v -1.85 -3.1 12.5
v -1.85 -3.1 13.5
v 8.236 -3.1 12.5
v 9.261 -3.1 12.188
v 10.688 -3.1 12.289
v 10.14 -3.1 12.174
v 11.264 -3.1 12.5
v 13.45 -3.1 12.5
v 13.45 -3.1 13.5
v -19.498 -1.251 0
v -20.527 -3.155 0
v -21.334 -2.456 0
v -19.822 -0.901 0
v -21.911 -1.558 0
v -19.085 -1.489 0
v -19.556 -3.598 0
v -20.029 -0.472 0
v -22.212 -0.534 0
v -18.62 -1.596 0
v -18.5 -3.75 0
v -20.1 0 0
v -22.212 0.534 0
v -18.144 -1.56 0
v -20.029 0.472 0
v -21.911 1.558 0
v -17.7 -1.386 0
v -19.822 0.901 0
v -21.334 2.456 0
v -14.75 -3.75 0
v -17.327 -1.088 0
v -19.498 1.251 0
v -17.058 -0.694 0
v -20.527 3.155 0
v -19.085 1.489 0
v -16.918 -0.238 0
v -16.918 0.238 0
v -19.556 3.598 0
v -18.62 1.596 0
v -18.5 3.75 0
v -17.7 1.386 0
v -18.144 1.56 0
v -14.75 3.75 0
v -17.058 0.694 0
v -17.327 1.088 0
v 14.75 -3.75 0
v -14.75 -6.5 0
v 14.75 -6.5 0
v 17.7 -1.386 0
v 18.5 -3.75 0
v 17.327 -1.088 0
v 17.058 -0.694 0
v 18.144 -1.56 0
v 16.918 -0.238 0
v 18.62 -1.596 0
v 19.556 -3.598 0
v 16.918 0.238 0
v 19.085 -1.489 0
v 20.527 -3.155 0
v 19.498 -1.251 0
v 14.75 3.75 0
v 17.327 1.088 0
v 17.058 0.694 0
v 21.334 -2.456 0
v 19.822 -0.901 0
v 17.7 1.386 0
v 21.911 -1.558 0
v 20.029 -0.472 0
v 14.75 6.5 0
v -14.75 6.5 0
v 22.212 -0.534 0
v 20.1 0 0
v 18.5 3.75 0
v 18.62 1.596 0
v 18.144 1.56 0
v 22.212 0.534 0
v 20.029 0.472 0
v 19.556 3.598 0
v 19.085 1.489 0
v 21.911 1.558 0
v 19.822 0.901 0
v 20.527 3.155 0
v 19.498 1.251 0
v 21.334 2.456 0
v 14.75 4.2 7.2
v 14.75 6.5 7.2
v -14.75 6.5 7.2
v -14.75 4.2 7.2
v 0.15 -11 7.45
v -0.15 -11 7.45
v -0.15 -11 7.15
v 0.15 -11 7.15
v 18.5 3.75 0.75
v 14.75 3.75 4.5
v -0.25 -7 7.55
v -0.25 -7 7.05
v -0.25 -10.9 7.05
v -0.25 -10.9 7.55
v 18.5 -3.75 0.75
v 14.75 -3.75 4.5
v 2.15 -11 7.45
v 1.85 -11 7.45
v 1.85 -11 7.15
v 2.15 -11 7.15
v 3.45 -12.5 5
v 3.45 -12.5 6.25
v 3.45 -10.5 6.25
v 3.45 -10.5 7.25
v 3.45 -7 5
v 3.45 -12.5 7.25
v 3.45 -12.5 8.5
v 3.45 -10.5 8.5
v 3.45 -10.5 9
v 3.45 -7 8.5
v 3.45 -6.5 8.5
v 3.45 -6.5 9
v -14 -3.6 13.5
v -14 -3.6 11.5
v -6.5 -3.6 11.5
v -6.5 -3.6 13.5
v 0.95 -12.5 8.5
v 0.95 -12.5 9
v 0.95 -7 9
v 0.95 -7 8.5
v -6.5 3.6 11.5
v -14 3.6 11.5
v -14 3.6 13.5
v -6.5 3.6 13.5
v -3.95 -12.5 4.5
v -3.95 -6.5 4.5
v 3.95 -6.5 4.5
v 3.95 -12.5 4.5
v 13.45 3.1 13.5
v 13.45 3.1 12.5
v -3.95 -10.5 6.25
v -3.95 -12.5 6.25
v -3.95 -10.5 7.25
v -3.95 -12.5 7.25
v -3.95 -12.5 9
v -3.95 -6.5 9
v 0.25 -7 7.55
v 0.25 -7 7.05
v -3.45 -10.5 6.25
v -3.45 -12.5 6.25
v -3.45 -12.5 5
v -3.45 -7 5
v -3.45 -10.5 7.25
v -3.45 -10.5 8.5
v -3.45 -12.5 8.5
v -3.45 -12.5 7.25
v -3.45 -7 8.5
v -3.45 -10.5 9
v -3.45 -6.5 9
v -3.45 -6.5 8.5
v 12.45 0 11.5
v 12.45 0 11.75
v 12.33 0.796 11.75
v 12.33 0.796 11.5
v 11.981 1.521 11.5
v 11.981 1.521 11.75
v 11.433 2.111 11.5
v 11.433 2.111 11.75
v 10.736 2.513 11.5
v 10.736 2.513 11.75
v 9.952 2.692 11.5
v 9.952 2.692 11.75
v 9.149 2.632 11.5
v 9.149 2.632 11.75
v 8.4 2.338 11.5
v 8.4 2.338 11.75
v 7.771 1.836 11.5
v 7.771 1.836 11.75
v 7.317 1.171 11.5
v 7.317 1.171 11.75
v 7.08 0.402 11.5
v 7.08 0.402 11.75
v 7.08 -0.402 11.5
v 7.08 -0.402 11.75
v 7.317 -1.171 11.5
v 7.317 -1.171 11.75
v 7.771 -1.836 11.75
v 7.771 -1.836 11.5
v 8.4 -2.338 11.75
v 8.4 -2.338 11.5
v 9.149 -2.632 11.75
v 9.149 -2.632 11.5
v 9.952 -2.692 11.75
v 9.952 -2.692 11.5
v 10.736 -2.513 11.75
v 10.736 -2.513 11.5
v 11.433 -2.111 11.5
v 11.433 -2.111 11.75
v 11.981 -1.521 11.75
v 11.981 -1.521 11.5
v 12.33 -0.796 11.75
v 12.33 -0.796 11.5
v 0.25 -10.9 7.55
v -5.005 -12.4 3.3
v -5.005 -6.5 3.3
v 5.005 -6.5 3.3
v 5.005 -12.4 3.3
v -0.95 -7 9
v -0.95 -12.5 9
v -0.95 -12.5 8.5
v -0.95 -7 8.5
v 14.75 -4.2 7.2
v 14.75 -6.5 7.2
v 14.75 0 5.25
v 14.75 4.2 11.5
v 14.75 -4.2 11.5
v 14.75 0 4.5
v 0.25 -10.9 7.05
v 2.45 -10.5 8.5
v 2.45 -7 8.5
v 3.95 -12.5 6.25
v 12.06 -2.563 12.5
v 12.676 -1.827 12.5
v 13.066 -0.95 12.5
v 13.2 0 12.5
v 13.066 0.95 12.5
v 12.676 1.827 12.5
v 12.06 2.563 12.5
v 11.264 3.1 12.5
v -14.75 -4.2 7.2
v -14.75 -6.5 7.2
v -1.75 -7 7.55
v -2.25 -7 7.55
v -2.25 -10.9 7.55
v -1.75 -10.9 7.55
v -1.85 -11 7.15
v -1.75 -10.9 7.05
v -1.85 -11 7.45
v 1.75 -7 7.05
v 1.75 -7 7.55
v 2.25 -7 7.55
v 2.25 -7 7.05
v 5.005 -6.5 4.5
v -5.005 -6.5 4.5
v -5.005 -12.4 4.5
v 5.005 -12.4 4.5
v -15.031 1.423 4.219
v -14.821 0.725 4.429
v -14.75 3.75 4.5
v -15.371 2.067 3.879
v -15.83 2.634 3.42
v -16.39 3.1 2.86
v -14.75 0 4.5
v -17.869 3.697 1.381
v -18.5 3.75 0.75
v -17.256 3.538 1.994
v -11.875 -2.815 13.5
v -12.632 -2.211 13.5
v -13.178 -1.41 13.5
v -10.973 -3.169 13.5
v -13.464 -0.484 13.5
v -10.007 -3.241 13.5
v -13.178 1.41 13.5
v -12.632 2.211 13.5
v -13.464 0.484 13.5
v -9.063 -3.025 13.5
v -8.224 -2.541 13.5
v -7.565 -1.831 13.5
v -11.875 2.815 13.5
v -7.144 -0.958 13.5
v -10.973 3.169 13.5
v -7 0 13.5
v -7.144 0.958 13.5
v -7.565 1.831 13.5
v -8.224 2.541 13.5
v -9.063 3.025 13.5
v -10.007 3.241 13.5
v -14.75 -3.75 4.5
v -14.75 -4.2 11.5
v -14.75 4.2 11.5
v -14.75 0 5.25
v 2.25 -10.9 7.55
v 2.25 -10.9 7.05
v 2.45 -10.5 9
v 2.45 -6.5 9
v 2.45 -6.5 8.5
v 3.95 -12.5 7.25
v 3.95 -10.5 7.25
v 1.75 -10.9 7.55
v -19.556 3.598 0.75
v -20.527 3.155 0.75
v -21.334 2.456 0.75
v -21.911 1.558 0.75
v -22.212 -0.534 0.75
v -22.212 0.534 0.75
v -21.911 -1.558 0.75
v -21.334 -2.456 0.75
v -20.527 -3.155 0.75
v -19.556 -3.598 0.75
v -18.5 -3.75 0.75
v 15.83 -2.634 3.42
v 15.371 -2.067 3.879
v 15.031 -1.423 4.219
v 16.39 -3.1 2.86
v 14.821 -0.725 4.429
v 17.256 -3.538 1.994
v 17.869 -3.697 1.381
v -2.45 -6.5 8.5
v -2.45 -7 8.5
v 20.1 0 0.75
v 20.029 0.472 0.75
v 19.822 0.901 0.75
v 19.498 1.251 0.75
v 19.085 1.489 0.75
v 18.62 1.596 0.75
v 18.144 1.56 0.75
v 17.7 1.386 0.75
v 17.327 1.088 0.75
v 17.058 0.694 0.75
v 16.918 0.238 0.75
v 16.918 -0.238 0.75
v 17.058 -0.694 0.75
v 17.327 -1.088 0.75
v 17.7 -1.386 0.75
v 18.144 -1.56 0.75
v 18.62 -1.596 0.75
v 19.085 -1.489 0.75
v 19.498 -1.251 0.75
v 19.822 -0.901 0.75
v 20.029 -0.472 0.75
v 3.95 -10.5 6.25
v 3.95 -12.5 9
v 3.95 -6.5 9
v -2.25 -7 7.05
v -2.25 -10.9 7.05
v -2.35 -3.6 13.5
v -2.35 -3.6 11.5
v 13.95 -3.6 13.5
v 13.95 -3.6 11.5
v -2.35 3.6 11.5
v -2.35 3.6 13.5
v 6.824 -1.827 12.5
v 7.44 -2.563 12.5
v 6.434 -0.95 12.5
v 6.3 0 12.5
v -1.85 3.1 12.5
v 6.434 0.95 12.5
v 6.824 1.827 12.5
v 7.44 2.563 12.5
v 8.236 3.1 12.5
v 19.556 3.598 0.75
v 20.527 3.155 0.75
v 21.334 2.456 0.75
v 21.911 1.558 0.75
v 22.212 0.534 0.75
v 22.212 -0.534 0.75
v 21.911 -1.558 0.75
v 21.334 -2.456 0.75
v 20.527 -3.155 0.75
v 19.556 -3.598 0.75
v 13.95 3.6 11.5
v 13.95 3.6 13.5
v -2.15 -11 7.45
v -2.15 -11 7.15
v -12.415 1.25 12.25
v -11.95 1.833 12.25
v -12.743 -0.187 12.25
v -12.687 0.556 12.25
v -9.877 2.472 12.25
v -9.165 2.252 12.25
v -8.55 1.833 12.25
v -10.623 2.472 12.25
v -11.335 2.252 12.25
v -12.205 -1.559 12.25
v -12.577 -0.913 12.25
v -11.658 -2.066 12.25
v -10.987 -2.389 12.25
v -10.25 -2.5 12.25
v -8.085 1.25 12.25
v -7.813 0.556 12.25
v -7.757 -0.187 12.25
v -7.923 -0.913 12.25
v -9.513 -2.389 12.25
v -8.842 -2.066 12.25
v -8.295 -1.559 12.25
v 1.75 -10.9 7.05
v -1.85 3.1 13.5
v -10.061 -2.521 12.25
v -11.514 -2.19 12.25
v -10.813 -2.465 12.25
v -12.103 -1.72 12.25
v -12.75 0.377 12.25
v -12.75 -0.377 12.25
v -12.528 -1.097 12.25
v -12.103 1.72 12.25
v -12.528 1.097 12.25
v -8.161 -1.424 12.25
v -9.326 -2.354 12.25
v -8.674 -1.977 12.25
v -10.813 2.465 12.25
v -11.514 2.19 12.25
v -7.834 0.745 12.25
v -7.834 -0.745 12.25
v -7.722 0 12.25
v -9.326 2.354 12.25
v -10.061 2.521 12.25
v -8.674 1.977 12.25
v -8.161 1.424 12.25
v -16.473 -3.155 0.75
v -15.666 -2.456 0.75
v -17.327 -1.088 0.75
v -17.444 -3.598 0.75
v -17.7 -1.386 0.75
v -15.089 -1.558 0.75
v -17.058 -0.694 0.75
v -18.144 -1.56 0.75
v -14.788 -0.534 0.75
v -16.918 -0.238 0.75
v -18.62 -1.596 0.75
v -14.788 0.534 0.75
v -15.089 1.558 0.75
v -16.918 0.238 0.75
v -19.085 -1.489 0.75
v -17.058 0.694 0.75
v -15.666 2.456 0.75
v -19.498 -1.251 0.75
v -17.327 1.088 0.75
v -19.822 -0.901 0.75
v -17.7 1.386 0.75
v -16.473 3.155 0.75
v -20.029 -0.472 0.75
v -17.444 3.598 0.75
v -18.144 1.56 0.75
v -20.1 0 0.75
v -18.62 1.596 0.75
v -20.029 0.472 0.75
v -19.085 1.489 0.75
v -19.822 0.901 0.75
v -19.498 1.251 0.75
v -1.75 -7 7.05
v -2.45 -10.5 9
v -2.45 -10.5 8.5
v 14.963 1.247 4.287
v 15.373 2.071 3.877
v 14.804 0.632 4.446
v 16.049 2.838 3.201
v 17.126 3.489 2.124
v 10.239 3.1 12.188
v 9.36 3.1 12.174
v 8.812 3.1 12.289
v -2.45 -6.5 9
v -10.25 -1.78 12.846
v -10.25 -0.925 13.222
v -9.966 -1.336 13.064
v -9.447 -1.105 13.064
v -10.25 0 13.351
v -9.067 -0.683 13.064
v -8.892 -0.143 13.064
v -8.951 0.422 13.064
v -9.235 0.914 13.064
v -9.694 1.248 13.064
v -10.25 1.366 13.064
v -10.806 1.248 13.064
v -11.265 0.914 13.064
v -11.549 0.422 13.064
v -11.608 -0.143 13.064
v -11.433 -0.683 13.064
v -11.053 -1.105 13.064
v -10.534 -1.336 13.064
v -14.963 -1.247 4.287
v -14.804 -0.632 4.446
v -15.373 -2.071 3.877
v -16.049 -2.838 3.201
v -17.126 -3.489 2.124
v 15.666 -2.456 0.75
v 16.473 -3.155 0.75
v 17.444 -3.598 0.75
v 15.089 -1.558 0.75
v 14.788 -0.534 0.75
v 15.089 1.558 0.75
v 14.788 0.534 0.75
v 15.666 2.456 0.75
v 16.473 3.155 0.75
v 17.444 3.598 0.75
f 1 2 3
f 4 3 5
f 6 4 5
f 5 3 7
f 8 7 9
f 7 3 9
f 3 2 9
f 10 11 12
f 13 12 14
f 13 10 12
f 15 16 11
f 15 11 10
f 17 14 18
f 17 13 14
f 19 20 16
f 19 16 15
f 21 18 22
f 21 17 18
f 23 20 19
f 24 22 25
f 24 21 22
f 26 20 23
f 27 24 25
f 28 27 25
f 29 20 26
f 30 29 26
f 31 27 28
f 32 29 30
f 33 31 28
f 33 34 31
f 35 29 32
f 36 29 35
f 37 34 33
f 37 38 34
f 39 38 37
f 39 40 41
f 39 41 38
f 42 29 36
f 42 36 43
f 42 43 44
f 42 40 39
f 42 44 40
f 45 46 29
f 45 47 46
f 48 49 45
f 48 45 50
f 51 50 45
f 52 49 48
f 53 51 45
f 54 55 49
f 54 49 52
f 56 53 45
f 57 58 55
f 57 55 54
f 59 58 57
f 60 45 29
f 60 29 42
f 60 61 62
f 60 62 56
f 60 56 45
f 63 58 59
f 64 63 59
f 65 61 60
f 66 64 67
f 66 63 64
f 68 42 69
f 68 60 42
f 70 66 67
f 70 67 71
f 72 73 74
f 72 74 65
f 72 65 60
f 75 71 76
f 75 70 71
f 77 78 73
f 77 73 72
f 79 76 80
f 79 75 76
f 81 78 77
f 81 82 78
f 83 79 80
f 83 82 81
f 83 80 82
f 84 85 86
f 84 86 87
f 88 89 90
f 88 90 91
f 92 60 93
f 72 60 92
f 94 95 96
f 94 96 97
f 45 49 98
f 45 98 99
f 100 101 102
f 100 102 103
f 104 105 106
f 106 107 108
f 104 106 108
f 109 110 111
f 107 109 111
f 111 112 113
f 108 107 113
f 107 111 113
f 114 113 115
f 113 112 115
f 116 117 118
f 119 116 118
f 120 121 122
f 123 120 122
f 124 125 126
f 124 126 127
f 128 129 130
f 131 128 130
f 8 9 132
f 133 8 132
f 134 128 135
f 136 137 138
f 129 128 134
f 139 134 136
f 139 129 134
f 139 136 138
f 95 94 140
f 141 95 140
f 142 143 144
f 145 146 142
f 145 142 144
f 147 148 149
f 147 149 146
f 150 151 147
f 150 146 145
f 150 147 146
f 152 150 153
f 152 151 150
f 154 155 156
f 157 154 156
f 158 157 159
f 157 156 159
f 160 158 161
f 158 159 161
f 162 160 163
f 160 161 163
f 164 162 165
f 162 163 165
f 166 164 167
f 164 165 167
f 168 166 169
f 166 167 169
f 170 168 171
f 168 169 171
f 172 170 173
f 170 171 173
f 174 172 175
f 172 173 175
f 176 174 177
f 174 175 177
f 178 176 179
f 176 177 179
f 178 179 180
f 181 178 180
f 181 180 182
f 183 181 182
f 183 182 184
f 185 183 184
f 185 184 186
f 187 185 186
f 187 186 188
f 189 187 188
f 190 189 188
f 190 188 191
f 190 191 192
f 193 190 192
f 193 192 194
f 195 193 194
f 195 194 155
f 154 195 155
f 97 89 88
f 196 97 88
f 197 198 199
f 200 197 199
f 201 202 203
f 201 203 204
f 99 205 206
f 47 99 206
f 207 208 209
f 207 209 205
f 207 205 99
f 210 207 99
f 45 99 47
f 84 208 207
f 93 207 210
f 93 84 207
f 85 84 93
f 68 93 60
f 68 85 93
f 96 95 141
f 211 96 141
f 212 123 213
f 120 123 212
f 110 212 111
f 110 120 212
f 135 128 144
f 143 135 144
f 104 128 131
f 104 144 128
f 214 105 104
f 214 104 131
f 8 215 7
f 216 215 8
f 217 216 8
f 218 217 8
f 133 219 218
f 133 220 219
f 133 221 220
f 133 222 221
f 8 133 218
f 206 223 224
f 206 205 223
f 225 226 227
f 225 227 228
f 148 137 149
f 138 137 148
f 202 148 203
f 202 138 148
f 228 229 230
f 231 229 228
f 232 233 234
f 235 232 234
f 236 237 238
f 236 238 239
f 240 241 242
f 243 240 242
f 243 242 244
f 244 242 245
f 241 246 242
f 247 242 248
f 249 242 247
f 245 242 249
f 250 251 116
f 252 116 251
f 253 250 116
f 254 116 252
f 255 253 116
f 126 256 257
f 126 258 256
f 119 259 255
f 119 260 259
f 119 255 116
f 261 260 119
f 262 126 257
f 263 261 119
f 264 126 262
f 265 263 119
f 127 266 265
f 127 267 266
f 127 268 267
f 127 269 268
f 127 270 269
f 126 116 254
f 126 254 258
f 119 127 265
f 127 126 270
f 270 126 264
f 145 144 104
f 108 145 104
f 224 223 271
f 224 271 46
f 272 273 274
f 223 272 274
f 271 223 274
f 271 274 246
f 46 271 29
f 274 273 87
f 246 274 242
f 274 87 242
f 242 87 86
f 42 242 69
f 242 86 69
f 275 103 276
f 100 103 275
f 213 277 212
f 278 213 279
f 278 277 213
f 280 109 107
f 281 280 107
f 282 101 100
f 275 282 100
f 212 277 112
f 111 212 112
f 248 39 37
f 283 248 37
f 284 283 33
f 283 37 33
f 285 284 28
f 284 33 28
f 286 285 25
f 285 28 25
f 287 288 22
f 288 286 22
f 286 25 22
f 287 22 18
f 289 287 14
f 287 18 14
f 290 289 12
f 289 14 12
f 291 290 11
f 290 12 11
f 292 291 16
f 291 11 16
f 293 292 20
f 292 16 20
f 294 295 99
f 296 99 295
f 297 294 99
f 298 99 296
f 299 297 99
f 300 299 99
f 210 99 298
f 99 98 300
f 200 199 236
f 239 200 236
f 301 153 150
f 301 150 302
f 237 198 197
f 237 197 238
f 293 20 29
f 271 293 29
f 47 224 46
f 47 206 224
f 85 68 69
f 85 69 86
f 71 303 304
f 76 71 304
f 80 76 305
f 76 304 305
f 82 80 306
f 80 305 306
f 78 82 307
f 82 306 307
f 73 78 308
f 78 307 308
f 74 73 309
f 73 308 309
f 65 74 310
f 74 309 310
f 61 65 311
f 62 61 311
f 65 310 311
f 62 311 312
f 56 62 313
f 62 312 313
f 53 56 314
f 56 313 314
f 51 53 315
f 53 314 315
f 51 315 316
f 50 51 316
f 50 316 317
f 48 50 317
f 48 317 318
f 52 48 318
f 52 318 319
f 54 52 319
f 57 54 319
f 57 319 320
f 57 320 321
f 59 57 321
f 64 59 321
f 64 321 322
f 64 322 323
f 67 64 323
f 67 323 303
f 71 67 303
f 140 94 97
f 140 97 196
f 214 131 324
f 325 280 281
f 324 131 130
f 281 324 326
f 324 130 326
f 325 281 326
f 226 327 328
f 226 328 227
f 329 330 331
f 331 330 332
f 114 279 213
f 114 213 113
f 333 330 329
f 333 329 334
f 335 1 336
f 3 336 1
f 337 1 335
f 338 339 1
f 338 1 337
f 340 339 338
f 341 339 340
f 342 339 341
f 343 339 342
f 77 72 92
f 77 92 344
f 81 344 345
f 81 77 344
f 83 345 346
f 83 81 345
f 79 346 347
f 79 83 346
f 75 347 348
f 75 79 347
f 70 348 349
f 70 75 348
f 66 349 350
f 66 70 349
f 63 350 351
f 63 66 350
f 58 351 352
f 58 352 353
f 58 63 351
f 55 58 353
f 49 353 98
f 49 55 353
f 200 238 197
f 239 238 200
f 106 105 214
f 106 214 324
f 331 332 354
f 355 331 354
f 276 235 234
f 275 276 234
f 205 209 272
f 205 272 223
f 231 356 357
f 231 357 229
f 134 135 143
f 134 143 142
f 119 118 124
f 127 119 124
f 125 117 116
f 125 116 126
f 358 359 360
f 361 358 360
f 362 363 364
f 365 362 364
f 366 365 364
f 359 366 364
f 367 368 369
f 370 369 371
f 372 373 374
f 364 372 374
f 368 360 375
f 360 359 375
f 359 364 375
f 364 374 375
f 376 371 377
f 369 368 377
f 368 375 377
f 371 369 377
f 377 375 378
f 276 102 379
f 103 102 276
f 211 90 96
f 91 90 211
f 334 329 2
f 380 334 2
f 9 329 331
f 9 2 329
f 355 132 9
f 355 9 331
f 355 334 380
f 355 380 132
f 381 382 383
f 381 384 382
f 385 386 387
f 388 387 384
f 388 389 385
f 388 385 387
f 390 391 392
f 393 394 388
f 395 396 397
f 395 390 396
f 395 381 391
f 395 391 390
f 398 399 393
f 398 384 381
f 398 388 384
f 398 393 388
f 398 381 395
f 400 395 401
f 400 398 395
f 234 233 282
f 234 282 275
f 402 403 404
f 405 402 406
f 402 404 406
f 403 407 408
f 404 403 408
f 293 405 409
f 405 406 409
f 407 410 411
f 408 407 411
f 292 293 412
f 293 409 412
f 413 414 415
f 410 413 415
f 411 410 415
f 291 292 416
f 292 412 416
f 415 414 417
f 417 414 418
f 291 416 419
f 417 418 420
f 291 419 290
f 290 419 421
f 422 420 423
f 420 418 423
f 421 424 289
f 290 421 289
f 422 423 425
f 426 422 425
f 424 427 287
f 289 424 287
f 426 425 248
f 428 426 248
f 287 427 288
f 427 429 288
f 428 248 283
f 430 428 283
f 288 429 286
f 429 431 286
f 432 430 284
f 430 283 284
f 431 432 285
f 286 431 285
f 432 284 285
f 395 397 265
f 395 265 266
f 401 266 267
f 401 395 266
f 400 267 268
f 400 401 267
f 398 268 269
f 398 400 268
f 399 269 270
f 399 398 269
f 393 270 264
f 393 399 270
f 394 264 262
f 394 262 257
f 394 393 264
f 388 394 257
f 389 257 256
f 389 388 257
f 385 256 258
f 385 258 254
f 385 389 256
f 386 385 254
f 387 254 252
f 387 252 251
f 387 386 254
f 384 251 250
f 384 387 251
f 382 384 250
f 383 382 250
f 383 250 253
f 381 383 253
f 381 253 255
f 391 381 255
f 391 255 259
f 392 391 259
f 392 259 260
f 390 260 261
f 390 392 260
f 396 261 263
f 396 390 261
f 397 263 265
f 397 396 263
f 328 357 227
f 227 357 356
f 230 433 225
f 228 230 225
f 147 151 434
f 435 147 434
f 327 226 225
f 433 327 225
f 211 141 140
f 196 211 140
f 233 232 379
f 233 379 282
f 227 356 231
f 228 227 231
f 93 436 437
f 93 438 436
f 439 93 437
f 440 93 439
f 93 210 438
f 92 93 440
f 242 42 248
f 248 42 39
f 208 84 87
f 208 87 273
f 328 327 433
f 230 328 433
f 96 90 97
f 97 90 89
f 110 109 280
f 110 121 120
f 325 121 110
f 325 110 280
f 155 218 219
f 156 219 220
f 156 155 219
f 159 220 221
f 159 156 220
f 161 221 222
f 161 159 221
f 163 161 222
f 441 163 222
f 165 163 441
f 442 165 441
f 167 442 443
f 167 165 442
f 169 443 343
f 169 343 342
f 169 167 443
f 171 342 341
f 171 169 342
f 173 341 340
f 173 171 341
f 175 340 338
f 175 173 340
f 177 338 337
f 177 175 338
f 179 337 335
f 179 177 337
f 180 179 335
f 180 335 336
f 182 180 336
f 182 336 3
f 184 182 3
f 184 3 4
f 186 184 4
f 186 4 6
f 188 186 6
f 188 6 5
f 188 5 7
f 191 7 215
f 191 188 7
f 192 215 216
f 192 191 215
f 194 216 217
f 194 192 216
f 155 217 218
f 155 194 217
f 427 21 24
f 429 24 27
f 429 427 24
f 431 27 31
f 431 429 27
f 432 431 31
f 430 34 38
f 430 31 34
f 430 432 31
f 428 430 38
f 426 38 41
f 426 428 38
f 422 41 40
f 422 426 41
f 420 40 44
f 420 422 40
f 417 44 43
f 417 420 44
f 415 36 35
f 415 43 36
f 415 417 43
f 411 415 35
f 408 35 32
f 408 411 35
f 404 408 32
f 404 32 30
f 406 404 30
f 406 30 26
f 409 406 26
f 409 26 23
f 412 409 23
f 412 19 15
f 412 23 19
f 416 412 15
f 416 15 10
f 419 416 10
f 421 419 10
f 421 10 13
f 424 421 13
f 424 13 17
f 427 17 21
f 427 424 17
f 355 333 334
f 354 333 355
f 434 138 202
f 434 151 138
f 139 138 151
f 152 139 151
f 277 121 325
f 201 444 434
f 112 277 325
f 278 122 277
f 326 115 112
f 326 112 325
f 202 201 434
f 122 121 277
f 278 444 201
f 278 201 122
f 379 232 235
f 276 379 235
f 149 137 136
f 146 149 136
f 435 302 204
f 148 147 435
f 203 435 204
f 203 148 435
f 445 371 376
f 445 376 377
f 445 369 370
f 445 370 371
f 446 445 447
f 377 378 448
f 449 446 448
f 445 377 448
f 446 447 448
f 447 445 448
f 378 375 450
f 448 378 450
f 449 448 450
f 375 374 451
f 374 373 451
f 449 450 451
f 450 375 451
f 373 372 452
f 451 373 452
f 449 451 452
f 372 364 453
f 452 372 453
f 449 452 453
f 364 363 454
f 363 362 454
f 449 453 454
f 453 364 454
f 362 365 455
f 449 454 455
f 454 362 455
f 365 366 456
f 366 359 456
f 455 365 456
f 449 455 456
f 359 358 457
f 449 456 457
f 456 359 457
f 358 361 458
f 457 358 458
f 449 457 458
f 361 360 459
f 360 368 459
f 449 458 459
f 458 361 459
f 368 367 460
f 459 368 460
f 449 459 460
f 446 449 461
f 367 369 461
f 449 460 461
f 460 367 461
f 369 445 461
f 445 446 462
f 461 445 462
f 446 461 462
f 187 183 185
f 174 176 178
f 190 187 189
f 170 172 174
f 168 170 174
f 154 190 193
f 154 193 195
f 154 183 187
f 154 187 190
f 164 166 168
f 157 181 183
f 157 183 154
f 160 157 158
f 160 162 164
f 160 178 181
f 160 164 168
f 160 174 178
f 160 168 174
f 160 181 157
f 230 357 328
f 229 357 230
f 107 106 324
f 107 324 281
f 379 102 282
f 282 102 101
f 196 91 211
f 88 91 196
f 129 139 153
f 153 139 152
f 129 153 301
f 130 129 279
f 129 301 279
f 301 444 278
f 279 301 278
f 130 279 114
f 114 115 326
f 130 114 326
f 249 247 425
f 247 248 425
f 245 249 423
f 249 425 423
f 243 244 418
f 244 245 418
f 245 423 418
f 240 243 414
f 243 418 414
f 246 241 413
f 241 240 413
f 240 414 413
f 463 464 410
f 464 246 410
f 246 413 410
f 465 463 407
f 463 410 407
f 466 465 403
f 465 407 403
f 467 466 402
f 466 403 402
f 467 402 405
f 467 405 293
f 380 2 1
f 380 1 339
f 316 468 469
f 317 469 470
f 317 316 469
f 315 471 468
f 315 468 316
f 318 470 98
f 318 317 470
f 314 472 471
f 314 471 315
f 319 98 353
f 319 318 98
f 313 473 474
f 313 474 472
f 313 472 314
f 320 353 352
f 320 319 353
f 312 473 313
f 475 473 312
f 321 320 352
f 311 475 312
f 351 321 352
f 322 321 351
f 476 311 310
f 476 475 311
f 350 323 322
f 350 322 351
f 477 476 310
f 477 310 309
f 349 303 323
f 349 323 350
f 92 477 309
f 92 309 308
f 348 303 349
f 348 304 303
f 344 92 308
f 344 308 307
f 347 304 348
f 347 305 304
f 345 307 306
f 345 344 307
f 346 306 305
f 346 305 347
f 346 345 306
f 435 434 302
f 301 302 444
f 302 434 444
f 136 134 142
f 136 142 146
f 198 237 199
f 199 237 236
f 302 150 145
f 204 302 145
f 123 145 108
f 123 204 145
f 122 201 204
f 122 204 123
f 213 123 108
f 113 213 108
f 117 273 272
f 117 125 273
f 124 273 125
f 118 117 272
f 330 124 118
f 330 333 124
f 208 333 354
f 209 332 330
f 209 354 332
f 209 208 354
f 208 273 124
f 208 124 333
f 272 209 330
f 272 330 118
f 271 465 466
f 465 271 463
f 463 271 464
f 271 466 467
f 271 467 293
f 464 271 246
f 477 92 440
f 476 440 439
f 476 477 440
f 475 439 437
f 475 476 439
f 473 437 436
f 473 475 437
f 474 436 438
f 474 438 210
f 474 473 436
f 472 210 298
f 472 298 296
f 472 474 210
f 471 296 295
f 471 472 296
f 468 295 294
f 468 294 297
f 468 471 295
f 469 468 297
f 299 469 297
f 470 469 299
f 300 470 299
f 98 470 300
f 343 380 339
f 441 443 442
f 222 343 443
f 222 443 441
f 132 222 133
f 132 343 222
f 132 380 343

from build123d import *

# Parameters (mm, degrees)
BOSS_EXTRUDE5_DEPTH  = 14.75
SKETCH9_W            = 7.5
SKETCH9_H            = 7.2
SKETCH9_W_2          = 16.3
BOSS_EXTRUDE6_DEPTH  = 2
SKETCH10_W           = 15.3
SKETCH10_H           = 6.2
CUT_EXTRUDE4_DEPTH   = 1
SKETCH11_R           = 2.5
CUT_EXTRUDE5_DEPTH   = 1.25
BOSS_EXTRUDE7_DEPTH  = 4.5
CUT_EXTRUDE7_START   = -7.5
CUT_EXTRUDE7_DEPTH   = 7.5
SKETCH18_R           = 3.75
CUT_EXTRUDE8_DEPTH   = 4.5
SKETCH19_R           = 1.6
CUT_EXTRUDE9_DEPTH   = 4.5
CHAMFER1_SIZE        = 0.75
CHAMFER1_SIZE_2      = 1.299038106
SKETCH13_R           = 2.7
CUT_EXTRUDE6_DEPTH   = 1
CHAMFER2_SIZE        = 0.75
SKETCH20_W           = 10.01
SKETCH20_H           = 1.2
BOSS_EXTRUDE8_DEPTH  = 5.9
SKETCH21_W           = 7.9
SKETCH21_H           = 4.5
BOSS_EXTRUDE9_DEPTH  = 6
SKETCH23_W           = 6.9
SKETCH23_H           = 3.5
CUT_EXTRUDE11_DEPTH  = 5.5
SKETCH24_W           = 1.9
SKETCH24_H           = 5.5
SKETCH24_W_2         = 1
SKETCH24_H_2         = 4
CUT_EXTRUDE12_DEPTH  = 0.5
CUT_EXTRUDE13_REACH  = 34.015
SKETCH25_W           = 1
SKETCH25_H           = 2
SKETCH26_W           = 0.5
SKETCH26_H           = 0.5
BOSS_EXTRUDE10_DEPTH = 4
CHAMFER3_SIZE        = 0.1
LPATTERN1_COUNT      = 3
LPATTERN1_PITCH      = 2


# Read off the part's stored shape, not the designer's step: Cut-Extrude7
with BuildPart() as part:
    # Sketch8 → Boss-Extrude5 (new, symmetric)
    with BuildSketch(Plane(origin=(0, 0, 0), x_dir=(0, 0, -1), z_dir=(1, 0, 0))):
        Polygon((0, -6.5), (0, 6.5), (-7.2, 6.5), (-7.2, 4.2), (-11.5, 4.2), (-11.5, -4.2), (-7.2, -4.2), (-7.2, -6.5), align=None)
    extrude(amount=BOSS_EXTRUDE5_DEPTH, both=True)

    # Sketch9 → Boss-Extrude6 (add)
    with BuildSketch(Plane.XY.offset(11.5)):
        with Locations((-10.25, 0)):
            Rectangle(SKETCH9_W, SKETCH9_H)
        with Locations((5.8, 0)):
            Rectangle(SKETCH9_W_2, SKETCH9_H)
    extrude(amount=BOSS_EXTRUDE6_DEPTH)

    # Sketch10 → Cut-Extrude4 (cut)
    with BuildSketch(Plane.XY.offset(13.5)):
        with Locations((5.8, 0)):
            Rectangle(SKETCH10_W, SKETCH10_H)
    extrude(amount=-CUT_EXTRUDE4_DEPTH, mode=Mode.SUBTRACT)

    # Sketch11 → Cut-Extrude5 (cut)
    with BuildSketch(Plane.XY.offset(13.5)):
        with Locations((-10.25, 0)):
            Circle(SKETCH11_R)
    extrude(amount=-CUT_EXTRUDE5_DEPTH, mode=Mode.SUBTRACT)

    # Sketch16 → Boss-Extrude7 (add)
    with BuildSketch(Plane(origin=(0, 0, 0), x_dir=(-1, 0, 0), z_dir=(0, 0, -1))):
        with BuildLine():
            Line((-14.75, -3.75), (-14.75, 3.75))
            Line((-14.75, 3.75), (-18.5, 3.75))
            ThreePointArc((-18.5, 3.75), (-22.25, 0), (-18.5, -3.75))
            Line((-18.5, -3.75), (-14.75, -3.75))
        make_face()
    boss_extrude7 = extrude(amount=-BOSS_EXTRUDE7_DEPTH)

    # Cut-Extrude7 outline → Cut-Extrude7 (cut)
    with BuildSketch(Plane.XZ.offset(3.75).offset(CUT_EXTRUDE7_START)):
        Polygon((14.75, 4.5), (18.5, 0.75), (24, 0.75), (24, 4.5), align=None)
    cut_extrude7 = extrude(amount=CUT_EXTRUDE7_DEPTH, mode=Mode.SUBTRACT)

    # Sketch18 → Cut-Extrude8 (cut)
    with BuildSketch(Plane.XY.offset(0.75)):
        with Locations((18.5, 0)):
            Circle(SKETCH18_R)
    cut_extrude8 = extrude(amount=CUT_EXTRUDE8_DEPTH, mode=Mode.SUBTRACT)

    # Sketch19 → Cut-Extrude9 (cut)
    with BuildSketch(Plane.XY.offset(0.75)):
        with Locations((18.5, 0)):
            Circle(SKETCH19_R)
    cut_extrude9 = extrude(amount=-CUT_EXTRUDE9_DEPTH, mode=Mode.SUBTRACT)

    # Mirror1: Boss-Extrude7, Cut-Extrude7, Cut-Extrude8, Cut-Extrude9 across plane
    add(boss_extrude7.mirror(Plane(origin=(0, 0, 0), x_dir=(0, 0, 1), z_dir=(1, 0, 0))))
    add(cut_extrude7.mirror(Plane(origin=(0, 0, 0), x_dir=(0, 0, 1), z_dir=(1, 0, 0))), mode=Mode.SUBTRACT)
    add(cut_extrude8.mirror(Plane(origin=(0, 0, 0), x_dir=(0, 0, 1), z_dir=(1, 0, 0))), mode=Mode.SUBTRACT)
    add(cut_extrude9.mirror(Plane(origin=(0, 0, 0), x_dir=(0, 0, 1), z_dir=(1, 0, 0))), mode=Mode.SUBTRACT)

    # Chamfer1
    # the kernel refuses this chamfer: 1.299038106, 0.75 mm, written as the material it takes off along each edge
    with BuildSketch(Plane(origin=(-10.25, 0, 13.5), x_dir=(1, 0, 0), z_dir=(0, -1, 0))) as chamfer1_piece_1_section:
        Polygon((2.5 + CHAMFER1_SIZE, 0), (2.5, -CHAMFER1_SIZE_2), (2.5, 0), align=None)
    chamfer1_piece_1 = revolve(axis=Axis((-10.25, 0, 13.5), (0, 0, 1)), mode=Mode.PRIVATE)
    chamfer1_piece_1 = split(chamfer1_piece_1, bisect_by=Plane(origin=(-13.133837987, 0, 12.25), z_dir=(0, 0, 1)), keep=Keep.TOP, mode=Mode.PRIVATE)
    add(chamfer1_piece_1, mode=Mode.SUBTRACT)

    # Sketch13 → Cut-Extrude6 (cut)
    with BuildSketch(Plane.XY.offset(12.5)):
        with Locations((9.75, 0)):
            Circle(SKETCH13_R)
    extrude(amount=-CUT_EXTRUDE6_DEPTH, mode=Mode.SUBTRACT)

    # Chamfer2
    # the kernel refuses this chamfer: 0.75 mm, written as the material it takes off along each edge
    with BuildSketch(Plane(origin=(9.75, 0, 12.5), x_dir=(1, 0, 0), z_dir=(0, -1, 0))) as chamfer2_piece_1_section:
        Polygon((2.7 + CHAMFER2_SIZE, 0), (2.7, -CHAMFER2_SIZE), (2.7, 0), align=None)
    chamfer2_piece_1 = revolve(axis=Axis((9.75, 0, 12.5), (0, 0, 1)), mode=Mode.PRIVATE)
    chamfer2_piece_1 = split(chamfer2_piece_1, bisect_by=Plane(origin=(6.68747717, -3.1, 12.13747717), z_dir=(0, 1, 0)), keep=Keep.TOP, mode=Mode.PRIVATE)
    chamfer2_piece_1 = split(chamfer2_piece_1, bisect_by=Plane(origin=(6.68747717, 3.1, 12.13747717), z_dir=(0, -1, 0)), keep=Keep.TOP, mode=Mode.PRIVATE)
    add(chamfer2_piece_1, mode=Mode.SUBTRACT)


with BuildPart() as body_2:
    # Sketch12 → Revolve1 (revolve)
    with BuildSketch(Plane.ZY.offset(10.25), mode=Mode.PRIVATE) as revolve1_sk:
        with BuildLine():
            Line((12.25, 2.5), (12.25, 0))
            Line((12.25, 0), (13.351165831, 0))
            ThreePointArc((13.351165831, 0), (13.063678836, 1.365884895), (12.25, 2.5))
        make_face()
    revolve(revolve1_sk.sketch.rotate(Axis((-10.25, 0, 12.25), (0, 0, 1)), 180), axis=Axis((-10.25, 0, 12.25), (0, 0, 1)))


with BuildPart() as body_3:
    # Sketch20 → Boss-Extrude8 (new body)
    with BuildSketch(Plane.XZ.offset(6.5)):
        with Locations((0, 3.9)):
            Rectangle(SKETCH20_W, SKETCH20_H)
    extrude(amount=BOSS_EXTRUDE8_DEPTH)


with BuildPart() as body_4:
    # Sketch21 → Boss-Extrude9 (new body)
    with BuildSketch(Plane.XZ.offset(6.5)):
        with Locations((0, 6.75)):
            Rectangle(SKETCH21_W, SKETCH21_H)
    extrude(amount=BOSS_EXTRUDE9_DEPTH)

    # Sketch23 → Cut-Extrude11 (cut)
    with BuildSketch(Plane.XZ.offset(12.5)):
        with Locations((0, 6.75)):
            Rectangle(SKETCH23_W, SKETCH23_H)
    extrude(amount=-CUT_EXTRUDE11_DEPTH, mode=Mode.SUBTRACT)

    # Sketch24 → Cut-Extrude12 (cut)
    with BuildSketch(Plane.XY.offset(9)):
        with Locations((0, -9.75)):
            Rectangle(SKETCH24_W, SKETCH24_H)
        with Locations((-2.95, -8.5)):
            Rectangle(SKETCH24_W_2, SKETCH24_H_2)
        with Locations((2.95, -8.5)):
            Rectangle(SKETCH24_W_2, SKETCH24_H_2)
    extrude(amount=-CUT_EXTRUDE12_DEPTH, mode=Mode.SUBTRACT)

    # Cut-Extrude13: up to this face of the body (flat: up to its plane)
    cut_extrude13_end = Plane(body_4.part.faces().sort_by_distance((3.95, -9.5, 6.75))[0])
    # Sketch25 → Cut-Extrude13 (cut, up to the picked face)
    with BuildSketch(Plane.ZY.offset(3.95), mode=Mode.PRIVATE) as cut_extrude13_sk1:
        with Locations((6.75, -11.5)):
            Rectangle(SKETCH25_W, SKETCH25_H)
    cut_extrude13_tool1 = split(extrude(cut_extrude13_sk1.sketch, amount=-CUT_EXTRUDE13_REACH, mode=Mode.PRIVATE), bisect_by=cut_extrude13_end, keep=Keep.BOTH, mode=Mode.PRIVATE)
    add(cut_extrude13_tool1.solids().sort_by(Axis((-3.95, -11.5, 6.75), (1, 0, 0)))[0], mode=Mode.SUBTRACT)


with BuildPart() as body_5:
    # Sketch26 → Boss-Extrude10 (new body)
    with BuildSketch(Plane.XZ.offset(7)):
        with Locations((-2, 7.3)):
            Rectangle(SKETCH26_W, SKETCH26_H)
    extrude(amount=BOSS_EXTRUDE10_DEPTH)

    # Chamfer3
    chamfer3_edges = [body_5.edges().sort_by_distance(p)[0] for p in [
        (-2.25, -11, 7.3),
        (-2, -11, 7.05),
        (-1.75, -11, 7.3),
        (-2, -11, 7.55),
    ]]
    chamfer(chamfer3_edges, length=CHAMFER3_SIZE)


with BuildPart() as lpattern1_1:
    # LPattern1: pattern copy
    add(body_5.part.moved(Location(Vector(1, 0, 0) * (1 * LPATTERN1_PITCH))))


with BuildPart() as lpattern1_2:
    # LPattern1: pattern copy
    add(body_5.part.moved(Location(Vector(1, 0, 0) * (2 * LPATTERN1_PITCH))))


solid = Compound([part.part, body_2.part, body_3.part, body_4.part, body_5.part, lpattern1_1.part, lpattern1_2.part])
